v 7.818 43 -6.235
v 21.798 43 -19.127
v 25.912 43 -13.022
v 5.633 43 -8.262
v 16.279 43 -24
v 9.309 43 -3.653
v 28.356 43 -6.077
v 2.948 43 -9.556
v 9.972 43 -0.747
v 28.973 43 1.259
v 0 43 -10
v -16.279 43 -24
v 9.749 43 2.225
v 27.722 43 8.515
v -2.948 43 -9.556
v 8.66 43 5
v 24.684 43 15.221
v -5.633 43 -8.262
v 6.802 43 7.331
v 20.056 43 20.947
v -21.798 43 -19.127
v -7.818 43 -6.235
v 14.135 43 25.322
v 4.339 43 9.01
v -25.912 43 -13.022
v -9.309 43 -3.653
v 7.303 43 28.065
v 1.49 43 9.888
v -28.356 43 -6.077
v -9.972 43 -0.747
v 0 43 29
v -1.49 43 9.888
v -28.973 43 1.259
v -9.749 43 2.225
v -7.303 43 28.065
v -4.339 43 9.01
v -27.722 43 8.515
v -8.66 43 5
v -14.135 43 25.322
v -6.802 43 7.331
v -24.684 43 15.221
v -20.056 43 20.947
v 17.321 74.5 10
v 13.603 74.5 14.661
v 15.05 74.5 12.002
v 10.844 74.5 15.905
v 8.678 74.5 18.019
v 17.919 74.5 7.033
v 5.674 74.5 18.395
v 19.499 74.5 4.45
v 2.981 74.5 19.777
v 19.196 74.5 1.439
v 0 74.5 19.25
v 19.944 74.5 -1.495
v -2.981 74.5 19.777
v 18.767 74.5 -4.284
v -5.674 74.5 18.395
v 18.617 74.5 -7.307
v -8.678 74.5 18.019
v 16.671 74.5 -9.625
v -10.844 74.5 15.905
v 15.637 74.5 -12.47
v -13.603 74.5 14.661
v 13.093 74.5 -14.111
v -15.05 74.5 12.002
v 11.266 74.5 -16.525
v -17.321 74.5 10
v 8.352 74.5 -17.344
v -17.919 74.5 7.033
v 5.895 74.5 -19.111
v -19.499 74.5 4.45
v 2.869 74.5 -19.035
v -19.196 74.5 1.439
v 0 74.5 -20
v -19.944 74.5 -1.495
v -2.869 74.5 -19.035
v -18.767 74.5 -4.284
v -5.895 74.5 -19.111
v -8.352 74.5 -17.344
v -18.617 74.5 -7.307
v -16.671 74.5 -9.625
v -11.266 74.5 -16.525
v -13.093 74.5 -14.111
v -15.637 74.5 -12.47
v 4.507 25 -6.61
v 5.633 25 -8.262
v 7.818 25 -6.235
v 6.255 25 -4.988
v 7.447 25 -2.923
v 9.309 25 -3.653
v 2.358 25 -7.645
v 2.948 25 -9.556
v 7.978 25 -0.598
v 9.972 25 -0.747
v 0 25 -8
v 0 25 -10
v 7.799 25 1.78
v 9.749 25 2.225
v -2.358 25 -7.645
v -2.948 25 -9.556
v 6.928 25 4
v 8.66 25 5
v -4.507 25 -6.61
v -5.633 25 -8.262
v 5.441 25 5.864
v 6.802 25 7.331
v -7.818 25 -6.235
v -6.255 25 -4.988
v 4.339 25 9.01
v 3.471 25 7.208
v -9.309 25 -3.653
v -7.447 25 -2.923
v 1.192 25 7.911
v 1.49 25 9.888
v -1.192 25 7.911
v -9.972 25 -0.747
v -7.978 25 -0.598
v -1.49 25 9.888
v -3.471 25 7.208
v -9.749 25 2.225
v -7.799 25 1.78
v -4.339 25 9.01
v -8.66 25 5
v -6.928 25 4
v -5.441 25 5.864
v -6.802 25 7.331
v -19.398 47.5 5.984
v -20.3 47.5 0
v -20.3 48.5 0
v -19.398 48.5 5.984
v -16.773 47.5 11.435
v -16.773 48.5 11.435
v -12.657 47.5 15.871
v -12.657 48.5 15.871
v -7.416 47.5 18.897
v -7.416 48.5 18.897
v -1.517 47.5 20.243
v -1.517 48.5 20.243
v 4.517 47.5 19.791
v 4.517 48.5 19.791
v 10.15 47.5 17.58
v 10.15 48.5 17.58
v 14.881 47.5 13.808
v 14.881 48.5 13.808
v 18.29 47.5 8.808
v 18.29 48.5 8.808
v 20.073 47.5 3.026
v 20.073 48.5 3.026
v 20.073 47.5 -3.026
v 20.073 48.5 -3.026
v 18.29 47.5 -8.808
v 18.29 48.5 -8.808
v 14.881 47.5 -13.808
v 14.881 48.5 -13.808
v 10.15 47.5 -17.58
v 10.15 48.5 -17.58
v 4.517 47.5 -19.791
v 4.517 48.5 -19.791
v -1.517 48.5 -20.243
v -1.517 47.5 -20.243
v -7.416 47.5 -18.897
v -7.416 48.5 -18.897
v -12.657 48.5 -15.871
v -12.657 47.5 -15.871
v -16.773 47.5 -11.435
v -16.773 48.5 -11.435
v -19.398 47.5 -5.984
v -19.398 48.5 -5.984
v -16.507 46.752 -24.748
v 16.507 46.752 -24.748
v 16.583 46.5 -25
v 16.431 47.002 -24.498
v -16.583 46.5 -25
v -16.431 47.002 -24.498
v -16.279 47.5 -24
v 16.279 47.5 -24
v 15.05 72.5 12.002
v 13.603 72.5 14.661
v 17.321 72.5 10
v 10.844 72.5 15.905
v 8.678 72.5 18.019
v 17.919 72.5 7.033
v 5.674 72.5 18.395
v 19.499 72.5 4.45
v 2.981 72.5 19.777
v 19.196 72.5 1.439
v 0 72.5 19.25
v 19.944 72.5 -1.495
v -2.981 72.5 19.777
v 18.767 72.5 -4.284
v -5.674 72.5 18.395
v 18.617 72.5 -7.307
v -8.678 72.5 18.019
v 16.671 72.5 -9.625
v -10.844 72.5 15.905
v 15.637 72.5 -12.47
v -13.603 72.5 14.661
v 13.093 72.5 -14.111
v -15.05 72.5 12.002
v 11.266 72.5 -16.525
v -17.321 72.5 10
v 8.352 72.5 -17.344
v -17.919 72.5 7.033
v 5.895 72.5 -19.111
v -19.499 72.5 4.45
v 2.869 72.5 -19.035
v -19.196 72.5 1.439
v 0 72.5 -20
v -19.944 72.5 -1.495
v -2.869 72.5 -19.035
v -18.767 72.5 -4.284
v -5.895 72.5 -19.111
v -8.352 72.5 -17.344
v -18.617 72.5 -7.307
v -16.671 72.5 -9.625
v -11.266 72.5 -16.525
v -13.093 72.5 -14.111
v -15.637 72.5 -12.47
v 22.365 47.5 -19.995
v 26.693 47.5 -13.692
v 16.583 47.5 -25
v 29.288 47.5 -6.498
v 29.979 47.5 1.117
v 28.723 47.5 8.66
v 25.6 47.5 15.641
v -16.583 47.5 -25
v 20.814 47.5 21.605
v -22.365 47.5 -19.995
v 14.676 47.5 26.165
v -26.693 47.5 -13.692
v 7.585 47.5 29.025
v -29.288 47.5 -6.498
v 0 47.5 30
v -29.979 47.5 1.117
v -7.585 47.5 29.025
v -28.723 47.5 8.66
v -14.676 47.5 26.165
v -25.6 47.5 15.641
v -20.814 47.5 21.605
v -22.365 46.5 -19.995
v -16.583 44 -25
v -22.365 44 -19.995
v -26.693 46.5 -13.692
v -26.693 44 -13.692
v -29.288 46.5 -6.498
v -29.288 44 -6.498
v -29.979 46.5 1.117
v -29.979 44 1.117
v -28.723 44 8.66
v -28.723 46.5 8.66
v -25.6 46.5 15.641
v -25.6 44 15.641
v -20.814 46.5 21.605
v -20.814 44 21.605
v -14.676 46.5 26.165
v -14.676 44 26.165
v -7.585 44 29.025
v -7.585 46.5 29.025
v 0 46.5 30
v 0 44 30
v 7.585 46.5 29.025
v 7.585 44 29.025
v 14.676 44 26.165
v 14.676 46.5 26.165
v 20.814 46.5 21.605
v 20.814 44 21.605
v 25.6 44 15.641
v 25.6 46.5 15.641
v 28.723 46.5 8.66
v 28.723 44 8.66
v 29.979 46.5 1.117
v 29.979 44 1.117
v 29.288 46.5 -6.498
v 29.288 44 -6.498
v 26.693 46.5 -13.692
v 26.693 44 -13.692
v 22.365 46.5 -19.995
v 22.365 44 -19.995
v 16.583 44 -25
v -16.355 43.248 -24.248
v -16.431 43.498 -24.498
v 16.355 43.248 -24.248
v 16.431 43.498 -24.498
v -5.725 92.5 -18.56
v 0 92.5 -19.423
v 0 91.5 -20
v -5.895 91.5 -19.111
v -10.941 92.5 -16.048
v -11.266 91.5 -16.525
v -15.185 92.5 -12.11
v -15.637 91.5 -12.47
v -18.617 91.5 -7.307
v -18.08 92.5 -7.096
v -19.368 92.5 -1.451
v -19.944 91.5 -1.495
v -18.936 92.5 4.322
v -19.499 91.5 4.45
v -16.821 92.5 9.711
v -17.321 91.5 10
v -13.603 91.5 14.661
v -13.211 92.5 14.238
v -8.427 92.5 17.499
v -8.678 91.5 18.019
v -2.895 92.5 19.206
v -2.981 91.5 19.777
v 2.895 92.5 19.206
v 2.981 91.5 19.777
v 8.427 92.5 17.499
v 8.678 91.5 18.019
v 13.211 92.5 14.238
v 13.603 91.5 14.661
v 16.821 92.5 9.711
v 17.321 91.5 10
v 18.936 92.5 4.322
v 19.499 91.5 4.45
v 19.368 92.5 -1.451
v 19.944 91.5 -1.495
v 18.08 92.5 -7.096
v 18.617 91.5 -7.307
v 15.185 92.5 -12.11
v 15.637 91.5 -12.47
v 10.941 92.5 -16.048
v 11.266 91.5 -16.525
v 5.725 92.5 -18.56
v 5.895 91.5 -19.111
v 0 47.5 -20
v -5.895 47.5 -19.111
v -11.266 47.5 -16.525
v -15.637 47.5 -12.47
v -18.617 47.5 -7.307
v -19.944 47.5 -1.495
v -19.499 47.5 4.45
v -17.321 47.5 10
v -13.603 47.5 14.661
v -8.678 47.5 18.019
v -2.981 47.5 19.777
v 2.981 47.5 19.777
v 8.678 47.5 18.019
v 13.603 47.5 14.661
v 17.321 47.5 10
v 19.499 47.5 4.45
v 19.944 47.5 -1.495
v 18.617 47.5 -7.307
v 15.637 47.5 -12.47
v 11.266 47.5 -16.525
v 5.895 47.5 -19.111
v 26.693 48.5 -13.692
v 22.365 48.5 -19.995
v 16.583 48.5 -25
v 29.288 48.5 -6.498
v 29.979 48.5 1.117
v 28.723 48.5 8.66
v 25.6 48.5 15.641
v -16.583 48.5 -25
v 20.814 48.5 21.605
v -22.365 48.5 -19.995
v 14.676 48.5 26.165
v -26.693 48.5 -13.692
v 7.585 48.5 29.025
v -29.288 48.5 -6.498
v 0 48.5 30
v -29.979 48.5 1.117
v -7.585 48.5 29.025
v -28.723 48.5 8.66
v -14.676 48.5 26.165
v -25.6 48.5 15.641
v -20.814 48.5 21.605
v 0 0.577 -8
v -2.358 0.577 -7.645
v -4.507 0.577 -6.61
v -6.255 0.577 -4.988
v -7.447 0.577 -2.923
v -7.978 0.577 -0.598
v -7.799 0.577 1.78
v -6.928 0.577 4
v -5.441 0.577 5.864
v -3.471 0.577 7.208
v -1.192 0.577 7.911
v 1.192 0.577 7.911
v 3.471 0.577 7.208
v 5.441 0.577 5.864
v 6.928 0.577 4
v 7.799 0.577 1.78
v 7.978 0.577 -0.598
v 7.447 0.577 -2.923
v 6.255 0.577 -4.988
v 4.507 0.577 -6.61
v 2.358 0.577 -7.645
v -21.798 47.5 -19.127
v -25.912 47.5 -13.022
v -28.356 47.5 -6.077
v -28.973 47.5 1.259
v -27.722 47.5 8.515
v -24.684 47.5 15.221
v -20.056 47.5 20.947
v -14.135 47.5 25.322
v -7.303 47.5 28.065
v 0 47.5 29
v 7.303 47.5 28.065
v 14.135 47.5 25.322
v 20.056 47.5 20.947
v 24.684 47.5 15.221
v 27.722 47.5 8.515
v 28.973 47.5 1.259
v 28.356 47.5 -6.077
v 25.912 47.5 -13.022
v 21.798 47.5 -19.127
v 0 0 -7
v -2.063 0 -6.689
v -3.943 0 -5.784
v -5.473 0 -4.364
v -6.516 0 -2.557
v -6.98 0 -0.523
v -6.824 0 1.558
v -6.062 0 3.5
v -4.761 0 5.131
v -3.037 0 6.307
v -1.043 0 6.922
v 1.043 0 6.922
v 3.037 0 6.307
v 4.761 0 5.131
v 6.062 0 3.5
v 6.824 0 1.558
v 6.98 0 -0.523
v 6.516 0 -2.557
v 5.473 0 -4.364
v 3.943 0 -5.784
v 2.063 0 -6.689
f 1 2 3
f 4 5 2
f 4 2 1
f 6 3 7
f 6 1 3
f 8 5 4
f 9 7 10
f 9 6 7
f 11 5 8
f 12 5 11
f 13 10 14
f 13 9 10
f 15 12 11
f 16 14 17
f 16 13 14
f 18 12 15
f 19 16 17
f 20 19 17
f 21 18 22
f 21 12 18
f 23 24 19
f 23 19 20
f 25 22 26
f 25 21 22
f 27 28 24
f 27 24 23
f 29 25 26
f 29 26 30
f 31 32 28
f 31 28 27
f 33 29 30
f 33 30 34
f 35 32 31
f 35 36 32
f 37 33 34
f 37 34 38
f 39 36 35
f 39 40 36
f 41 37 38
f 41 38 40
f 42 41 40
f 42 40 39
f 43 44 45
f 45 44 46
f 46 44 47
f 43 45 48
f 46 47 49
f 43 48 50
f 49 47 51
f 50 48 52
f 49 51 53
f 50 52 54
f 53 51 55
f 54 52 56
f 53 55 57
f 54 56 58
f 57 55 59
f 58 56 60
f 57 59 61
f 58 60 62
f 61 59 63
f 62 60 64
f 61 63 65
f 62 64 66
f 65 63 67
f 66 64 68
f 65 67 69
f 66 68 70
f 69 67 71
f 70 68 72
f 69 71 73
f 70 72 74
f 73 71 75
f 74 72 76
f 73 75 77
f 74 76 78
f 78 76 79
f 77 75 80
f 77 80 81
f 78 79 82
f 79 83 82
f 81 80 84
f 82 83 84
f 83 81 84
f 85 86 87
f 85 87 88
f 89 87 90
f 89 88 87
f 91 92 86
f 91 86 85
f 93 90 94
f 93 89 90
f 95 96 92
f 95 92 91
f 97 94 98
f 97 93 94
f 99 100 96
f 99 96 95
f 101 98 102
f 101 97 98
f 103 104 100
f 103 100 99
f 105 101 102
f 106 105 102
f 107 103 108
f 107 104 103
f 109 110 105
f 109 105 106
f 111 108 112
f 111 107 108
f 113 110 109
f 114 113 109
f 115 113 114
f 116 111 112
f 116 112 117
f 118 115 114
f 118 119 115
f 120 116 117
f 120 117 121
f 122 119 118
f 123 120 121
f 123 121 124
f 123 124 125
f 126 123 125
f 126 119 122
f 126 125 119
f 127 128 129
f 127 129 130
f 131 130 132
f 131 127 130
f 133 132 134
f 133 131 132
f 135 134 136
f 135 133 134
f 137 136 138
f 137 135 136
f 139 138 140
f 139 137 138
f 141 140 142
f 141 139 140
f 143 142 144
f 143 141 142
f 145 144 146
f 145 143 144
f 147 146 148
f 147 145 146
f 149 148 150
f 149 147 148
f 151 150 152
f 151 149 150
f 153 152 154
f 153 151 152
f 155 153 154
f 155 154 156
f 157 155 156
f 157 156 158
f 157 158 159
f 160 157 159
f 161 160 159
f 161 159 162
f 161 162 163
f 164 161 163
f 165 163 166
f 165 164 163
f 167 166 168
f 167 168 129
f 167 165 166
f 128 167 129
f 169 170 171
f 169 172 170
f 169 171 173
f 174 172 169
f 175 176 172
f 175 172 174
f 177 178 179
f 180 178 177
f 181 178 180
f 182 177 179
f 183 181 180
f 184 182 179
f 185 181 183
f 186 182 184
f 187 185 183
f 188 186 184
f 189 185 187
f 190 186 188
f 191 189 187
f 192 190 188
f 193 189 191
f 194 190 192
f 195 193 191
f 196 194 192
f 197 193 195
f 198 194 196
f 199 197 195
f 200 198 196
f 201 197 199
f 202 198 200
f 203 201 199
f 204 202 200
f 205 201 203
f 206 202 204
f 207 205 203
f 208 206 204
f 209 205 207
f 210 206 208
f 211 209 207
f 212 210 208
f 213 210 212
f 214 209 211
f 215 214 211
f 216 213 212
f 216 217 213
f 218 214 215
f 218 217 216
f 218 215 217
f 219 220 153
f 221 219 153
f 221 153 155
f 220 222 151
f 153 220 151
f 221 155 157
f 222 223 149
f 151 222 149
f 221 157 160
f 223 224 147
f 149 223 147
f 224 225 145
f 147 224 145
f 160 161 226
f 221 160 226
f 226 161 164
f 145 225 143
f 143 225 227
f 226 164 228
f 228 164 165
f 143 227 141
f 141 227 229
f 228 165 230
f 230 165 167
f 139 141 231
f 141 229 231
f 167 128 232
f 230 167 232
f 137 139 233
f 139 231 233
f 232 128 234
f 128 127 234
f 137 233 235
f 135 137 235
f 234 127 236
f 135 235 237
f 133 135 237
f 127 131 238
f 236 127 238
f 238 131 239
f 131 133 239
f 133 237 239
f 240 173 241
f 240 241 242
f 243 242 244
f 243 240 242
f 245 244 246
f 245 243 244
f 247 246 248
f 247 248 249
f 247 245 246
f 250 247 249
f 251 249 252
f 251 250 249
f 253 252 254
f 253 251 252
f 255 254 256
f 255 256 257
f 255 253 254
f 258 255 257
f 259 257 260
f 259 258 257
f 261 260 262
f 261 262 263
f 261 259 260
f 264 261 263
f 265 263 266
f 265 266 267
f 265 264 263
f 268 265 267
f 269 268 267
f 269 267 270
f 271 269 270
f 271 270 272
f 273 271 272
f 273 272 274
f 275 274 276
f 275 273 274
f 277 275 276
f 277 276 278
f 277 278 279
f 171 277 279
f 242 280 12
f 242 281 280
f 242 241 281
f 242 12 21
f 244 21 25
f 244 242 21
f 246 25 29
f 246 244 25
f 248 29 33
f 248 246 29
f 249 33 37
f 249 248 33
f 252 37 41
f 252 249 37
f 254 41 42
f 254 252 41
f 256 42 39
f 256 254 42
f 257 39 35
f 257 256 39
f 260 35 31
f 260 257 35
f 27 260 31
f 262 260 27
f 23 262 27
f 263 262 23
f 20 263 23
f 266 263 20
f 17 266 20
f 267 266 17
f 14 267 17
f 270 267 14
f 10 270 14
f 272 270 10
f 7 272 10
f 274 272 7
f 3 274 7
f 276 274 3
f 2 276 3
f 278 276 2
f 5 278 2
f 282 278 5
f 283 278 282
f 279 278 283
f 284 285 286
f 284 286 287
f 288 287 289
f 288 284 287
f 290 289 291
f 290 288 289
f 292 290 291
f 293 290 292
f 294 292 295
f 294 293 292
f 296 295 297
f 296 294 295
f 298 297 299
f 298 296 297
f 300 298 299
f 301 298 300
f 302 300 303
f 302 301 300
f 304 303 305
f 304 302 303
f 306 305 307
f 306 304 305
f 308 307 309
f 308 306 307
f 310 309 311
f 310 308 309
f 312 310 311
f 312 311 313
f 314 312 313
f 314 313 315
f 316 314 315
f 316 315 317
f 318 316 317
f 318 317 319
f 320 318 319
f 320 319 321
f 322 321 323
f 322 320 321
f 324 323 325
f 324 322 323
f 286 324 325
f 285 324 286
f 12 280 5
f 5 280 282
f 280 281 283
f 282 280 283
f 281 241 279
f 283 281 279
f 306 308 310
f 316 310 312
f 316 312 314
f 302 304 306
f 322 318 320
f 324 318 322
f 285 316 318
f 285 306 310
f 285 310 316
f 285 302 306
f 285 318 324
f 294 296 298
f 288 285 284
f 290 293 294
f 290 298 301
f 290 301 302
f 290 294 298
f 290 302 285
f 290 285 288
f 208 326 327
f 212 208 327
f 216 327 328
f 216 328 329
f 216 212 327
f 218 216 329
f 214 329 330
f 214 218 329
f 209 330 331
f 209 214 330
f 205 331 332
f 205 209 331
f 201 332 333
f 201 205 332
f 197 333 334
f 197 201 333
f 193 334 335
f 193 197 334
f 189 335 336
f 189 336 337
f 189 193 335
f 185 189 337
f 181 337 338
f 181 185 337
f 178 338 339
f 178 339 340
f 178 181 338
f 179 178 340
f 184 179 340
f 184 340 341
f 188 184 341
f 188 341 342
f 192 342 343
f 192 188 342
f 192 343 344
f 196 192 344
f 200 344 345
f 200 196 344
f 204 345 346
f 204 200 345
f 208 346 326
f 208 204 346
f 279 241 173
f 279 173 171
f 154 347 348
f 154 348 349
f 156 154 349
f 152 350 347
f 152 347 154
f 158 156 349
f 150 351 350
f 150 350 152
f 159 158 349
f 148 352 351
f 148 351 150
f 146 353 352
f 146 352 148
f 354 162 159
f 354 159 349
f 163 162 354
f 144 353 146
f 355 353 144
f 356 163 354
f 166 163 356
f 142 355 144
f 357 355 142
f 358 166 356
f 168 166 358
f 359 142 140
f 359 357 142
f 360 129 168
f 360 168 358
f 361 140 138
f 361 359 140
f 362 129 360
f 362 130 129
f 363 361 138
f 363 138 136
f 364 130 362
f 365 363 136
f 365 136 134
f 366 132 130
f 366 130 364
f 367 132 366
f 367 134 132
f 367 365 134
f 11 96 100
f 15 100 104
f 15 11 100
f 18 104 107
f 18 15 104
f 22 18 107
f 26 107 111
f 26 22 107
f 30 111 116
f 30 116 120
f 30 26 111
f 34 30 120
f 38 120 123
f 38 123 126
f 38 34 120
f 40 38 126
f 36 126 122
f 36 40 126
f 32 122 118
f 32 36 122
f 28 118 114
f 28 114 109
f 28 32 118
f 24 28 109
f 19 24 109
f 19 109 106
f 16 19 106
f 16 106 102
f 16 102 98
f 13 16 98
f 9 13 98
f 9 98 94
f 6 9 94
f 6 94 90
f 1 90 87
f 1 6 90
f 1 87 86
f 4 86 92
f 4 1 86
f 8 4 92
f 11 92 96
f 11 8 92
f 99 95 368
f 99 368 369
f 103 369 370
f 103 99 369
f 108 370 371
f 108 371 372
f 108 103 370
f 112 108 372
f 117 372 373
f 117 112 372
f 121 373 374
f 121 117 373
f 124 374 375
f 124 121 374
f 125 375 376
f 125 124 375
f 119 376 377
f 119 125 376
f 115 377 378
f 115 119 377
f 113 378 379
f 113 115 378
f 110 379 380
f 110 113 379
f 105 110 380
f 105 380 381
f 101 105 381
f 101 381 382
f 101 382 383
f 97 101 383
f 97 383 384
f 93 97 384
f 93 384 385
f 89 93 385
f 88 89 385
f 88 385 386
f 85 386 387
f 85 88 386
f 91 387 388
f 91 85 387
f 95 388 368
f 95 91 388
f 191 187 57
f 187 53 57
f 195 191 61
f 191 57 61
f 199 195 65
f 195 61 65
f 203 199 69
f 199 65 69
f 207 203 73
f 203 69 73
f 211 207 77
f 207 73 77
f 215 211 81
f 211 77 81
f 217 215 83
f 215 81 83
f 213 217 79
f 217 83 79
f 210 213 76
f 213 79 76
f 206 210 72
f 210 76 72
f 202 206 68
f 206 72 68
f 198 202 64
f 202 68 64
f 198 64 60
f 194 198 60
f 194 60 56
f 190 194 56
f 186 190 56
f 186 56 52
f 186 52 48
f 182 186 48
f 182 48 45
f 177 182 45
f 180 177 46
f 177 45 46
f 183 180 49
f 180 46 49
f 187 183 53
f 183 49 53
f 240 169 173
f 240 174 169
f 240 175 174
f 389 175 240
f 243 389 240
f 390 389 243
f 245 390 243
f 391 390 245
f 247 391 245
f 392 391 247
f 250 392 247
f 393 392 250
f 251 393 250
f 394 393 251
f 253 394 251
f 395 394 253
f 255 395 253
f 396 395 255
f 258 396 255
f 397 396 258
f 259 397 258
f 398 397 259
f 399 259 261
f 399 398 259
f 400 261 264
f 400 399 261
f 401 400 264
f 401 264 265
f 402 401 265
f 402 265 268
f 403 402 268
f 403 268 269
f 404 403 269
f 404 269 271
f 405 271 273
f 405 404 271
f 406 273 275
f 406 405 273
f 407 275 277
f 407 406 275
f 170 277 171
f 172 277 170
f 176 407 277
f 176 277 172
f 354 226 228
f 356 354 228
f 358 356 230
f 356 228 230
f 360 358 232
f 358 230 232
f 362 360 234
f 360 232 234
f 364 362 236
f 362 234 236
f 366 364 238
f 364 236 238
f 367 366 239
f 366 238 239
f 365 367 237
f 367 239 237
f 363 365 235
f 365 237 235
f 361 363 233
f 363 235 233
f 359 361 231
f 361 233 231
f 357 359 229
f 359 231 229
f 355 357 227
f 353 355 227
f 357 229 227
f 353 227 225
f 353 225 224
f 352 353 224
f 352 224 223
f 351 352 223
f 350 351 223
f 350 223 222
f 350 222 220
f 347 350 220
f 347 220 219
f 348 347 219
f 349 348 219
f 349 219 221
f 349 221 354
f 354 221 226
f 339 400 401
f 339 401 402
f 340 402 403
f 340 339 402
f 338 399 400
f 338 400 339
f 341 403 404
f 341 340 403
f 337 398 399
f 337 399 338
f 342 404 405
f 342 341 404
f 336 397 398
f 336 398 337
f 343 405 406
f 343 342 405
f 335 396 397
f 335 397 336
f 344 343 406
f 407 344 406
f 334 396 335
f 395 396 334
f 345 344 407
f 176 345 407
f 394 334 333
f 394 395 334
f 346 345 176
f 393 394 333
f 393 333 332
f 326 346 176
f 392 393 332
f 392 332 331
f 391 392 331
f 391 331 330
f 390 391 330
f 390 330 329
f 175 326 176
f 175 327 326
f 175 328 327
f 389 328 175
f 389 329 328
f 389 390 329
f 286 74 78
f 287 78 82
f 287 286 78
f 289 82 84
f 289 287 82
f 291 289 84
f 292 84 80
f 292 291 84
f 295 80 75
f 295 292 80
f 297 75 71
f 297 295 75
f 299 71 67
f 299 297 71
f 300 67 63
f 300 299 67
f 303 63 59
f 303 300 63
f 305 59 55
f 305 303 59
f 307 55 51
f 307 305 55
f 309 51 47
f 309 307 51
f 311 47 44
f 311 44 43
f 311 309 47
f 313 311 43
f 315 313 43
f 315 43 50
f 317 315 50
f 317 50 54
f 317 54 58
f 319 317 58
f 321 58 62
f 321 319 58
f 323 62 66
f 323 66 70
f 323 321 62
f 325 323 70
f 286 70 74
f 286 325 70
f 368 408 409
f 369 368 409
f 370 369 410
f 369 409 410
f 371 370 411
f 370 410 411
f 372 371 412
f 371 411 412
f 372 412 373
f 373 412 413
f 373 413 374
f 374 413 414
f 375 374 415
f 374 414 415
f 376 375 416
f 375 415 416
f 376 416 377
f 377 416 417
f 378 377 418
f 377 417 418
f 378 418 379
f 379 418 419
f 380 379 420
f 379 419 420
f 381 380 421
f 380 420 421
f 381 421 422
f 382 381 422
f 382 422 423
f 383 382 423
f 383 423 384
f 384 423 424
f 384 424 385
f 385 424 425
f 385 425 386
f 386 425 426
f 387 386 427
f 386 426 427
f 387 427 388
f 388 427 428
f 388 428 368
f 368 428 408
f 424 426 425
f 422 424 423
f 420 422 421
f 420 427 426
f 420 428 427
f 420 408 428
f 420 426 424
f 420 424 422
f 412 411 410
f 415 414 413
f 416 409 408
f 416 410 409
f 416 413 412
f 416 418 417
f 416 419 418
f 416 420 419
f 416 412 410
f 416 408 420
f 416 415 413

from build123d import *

# Parameters (mm, degrees)
F2_W        = 60
F2_H        = 10
F3_DEPTH    = 92.501
F4_SIZE     = 1
F5_C1_SIZE2 = 1
F5_C1_SIZE  = 0.5773502692
F5_C2_SIZE2 = 0.5773502692
F5_C2_SIZE  = 1
F6_W        = 2
F6_H        = 2
F8_R        = 20.3
F9_DEPTH    = 1


with BuildPart() as f1:
    # F0 (on Right) → F1 (revolve)
    with BuildSketch(Plane.YZ):
        Polygon((92.5, 0), (0, 0), (0, -8), (25, -8), (25, -10), (43, -10), (43, -30), (47.5, -30), (47.5, -20), (92.5, -20), align=None)
    revolve(axis=Axis((0, 37.7989597619, 0), (0, 1, 0)))

    # F2 (on Front) → F3 (cut, through all)
    with BuildSketch(Plane.XZ):
        with Locations((0, -30)):
            Rectangle(F2_W, F2_H)
    extrude(amount=-F3_DEPTH, mode=Mode.SUBTRACT)

    # F4
    f4_edges = [f1.edges().sort_by_distance(p)[0] for p in [
        (0, 47.5, 30),
        (0, 47.5, -25),
        (0, 43, 30),
        (0, 43, -25),
    ]]
    chamfer(f4_edges, length=F4_SIZE)

    # F5: chamfer of 1 x 0.5773502692 on 2 edges, made by hand

    # F5_c1
    f5_c1_edges = [f1.edges().sort_by_distance(p)[0] for p in [
        (0, 0, 8),
    ]]
    f5_c1_side = f1.faces().sort_by_distance((0, 0.0115470054, 8))[0]
    chamfer(f5_c1_edges, length=F5_C1_SIZE, length2=F5_C1_SIZE2, reference=f5_c1_side)

    # F5_c2
    f5_c2_edges = [f1.edges().sort_by_distance(p)[0] for p in [
        (0, 92.5, 20),
    ]]
    f5_c2_side = f1.faces().sort_by_distance((0, 92.4884529946, 20))[0]
    chamfer(f5_c2_edges, length=F5_C2_SIZE, length2=F5_C2_SIZE2, reference=f5_c2_side)

    # F6 (on Right) → F7 (revolve, cut)
    with BuildSketch(Plane.YZ):
        with Locations((73.5, 20.25)):
            Rectangle(F6_W, F6_H)
    revolve(axis=Axis((0, 66.5382612497, 0), (0, -1, 0)), mode=Mode.SUBTRACT)


with BuildPart() as f9:
    # F8 (on face) → F9 (new body)
    with BuildSketch(Plane(origin=(0, 47.5, 0), x_dir=(-1, 0, 0), z_dir=(0, 1, 0))):
        with BuildLine():
            ThreePointArc((16.5831239518, -25), (0, 30), (-16.5831239518, -25))
            Line((-16.5831239518, -25), (16.5831239518, -25))
        make_face()
        Circle(F8_R, mode=Mode.SUBTRACT)
    extrude(amount=F9_DEPTH)


solid = Compound([f1.part, f9.part])
